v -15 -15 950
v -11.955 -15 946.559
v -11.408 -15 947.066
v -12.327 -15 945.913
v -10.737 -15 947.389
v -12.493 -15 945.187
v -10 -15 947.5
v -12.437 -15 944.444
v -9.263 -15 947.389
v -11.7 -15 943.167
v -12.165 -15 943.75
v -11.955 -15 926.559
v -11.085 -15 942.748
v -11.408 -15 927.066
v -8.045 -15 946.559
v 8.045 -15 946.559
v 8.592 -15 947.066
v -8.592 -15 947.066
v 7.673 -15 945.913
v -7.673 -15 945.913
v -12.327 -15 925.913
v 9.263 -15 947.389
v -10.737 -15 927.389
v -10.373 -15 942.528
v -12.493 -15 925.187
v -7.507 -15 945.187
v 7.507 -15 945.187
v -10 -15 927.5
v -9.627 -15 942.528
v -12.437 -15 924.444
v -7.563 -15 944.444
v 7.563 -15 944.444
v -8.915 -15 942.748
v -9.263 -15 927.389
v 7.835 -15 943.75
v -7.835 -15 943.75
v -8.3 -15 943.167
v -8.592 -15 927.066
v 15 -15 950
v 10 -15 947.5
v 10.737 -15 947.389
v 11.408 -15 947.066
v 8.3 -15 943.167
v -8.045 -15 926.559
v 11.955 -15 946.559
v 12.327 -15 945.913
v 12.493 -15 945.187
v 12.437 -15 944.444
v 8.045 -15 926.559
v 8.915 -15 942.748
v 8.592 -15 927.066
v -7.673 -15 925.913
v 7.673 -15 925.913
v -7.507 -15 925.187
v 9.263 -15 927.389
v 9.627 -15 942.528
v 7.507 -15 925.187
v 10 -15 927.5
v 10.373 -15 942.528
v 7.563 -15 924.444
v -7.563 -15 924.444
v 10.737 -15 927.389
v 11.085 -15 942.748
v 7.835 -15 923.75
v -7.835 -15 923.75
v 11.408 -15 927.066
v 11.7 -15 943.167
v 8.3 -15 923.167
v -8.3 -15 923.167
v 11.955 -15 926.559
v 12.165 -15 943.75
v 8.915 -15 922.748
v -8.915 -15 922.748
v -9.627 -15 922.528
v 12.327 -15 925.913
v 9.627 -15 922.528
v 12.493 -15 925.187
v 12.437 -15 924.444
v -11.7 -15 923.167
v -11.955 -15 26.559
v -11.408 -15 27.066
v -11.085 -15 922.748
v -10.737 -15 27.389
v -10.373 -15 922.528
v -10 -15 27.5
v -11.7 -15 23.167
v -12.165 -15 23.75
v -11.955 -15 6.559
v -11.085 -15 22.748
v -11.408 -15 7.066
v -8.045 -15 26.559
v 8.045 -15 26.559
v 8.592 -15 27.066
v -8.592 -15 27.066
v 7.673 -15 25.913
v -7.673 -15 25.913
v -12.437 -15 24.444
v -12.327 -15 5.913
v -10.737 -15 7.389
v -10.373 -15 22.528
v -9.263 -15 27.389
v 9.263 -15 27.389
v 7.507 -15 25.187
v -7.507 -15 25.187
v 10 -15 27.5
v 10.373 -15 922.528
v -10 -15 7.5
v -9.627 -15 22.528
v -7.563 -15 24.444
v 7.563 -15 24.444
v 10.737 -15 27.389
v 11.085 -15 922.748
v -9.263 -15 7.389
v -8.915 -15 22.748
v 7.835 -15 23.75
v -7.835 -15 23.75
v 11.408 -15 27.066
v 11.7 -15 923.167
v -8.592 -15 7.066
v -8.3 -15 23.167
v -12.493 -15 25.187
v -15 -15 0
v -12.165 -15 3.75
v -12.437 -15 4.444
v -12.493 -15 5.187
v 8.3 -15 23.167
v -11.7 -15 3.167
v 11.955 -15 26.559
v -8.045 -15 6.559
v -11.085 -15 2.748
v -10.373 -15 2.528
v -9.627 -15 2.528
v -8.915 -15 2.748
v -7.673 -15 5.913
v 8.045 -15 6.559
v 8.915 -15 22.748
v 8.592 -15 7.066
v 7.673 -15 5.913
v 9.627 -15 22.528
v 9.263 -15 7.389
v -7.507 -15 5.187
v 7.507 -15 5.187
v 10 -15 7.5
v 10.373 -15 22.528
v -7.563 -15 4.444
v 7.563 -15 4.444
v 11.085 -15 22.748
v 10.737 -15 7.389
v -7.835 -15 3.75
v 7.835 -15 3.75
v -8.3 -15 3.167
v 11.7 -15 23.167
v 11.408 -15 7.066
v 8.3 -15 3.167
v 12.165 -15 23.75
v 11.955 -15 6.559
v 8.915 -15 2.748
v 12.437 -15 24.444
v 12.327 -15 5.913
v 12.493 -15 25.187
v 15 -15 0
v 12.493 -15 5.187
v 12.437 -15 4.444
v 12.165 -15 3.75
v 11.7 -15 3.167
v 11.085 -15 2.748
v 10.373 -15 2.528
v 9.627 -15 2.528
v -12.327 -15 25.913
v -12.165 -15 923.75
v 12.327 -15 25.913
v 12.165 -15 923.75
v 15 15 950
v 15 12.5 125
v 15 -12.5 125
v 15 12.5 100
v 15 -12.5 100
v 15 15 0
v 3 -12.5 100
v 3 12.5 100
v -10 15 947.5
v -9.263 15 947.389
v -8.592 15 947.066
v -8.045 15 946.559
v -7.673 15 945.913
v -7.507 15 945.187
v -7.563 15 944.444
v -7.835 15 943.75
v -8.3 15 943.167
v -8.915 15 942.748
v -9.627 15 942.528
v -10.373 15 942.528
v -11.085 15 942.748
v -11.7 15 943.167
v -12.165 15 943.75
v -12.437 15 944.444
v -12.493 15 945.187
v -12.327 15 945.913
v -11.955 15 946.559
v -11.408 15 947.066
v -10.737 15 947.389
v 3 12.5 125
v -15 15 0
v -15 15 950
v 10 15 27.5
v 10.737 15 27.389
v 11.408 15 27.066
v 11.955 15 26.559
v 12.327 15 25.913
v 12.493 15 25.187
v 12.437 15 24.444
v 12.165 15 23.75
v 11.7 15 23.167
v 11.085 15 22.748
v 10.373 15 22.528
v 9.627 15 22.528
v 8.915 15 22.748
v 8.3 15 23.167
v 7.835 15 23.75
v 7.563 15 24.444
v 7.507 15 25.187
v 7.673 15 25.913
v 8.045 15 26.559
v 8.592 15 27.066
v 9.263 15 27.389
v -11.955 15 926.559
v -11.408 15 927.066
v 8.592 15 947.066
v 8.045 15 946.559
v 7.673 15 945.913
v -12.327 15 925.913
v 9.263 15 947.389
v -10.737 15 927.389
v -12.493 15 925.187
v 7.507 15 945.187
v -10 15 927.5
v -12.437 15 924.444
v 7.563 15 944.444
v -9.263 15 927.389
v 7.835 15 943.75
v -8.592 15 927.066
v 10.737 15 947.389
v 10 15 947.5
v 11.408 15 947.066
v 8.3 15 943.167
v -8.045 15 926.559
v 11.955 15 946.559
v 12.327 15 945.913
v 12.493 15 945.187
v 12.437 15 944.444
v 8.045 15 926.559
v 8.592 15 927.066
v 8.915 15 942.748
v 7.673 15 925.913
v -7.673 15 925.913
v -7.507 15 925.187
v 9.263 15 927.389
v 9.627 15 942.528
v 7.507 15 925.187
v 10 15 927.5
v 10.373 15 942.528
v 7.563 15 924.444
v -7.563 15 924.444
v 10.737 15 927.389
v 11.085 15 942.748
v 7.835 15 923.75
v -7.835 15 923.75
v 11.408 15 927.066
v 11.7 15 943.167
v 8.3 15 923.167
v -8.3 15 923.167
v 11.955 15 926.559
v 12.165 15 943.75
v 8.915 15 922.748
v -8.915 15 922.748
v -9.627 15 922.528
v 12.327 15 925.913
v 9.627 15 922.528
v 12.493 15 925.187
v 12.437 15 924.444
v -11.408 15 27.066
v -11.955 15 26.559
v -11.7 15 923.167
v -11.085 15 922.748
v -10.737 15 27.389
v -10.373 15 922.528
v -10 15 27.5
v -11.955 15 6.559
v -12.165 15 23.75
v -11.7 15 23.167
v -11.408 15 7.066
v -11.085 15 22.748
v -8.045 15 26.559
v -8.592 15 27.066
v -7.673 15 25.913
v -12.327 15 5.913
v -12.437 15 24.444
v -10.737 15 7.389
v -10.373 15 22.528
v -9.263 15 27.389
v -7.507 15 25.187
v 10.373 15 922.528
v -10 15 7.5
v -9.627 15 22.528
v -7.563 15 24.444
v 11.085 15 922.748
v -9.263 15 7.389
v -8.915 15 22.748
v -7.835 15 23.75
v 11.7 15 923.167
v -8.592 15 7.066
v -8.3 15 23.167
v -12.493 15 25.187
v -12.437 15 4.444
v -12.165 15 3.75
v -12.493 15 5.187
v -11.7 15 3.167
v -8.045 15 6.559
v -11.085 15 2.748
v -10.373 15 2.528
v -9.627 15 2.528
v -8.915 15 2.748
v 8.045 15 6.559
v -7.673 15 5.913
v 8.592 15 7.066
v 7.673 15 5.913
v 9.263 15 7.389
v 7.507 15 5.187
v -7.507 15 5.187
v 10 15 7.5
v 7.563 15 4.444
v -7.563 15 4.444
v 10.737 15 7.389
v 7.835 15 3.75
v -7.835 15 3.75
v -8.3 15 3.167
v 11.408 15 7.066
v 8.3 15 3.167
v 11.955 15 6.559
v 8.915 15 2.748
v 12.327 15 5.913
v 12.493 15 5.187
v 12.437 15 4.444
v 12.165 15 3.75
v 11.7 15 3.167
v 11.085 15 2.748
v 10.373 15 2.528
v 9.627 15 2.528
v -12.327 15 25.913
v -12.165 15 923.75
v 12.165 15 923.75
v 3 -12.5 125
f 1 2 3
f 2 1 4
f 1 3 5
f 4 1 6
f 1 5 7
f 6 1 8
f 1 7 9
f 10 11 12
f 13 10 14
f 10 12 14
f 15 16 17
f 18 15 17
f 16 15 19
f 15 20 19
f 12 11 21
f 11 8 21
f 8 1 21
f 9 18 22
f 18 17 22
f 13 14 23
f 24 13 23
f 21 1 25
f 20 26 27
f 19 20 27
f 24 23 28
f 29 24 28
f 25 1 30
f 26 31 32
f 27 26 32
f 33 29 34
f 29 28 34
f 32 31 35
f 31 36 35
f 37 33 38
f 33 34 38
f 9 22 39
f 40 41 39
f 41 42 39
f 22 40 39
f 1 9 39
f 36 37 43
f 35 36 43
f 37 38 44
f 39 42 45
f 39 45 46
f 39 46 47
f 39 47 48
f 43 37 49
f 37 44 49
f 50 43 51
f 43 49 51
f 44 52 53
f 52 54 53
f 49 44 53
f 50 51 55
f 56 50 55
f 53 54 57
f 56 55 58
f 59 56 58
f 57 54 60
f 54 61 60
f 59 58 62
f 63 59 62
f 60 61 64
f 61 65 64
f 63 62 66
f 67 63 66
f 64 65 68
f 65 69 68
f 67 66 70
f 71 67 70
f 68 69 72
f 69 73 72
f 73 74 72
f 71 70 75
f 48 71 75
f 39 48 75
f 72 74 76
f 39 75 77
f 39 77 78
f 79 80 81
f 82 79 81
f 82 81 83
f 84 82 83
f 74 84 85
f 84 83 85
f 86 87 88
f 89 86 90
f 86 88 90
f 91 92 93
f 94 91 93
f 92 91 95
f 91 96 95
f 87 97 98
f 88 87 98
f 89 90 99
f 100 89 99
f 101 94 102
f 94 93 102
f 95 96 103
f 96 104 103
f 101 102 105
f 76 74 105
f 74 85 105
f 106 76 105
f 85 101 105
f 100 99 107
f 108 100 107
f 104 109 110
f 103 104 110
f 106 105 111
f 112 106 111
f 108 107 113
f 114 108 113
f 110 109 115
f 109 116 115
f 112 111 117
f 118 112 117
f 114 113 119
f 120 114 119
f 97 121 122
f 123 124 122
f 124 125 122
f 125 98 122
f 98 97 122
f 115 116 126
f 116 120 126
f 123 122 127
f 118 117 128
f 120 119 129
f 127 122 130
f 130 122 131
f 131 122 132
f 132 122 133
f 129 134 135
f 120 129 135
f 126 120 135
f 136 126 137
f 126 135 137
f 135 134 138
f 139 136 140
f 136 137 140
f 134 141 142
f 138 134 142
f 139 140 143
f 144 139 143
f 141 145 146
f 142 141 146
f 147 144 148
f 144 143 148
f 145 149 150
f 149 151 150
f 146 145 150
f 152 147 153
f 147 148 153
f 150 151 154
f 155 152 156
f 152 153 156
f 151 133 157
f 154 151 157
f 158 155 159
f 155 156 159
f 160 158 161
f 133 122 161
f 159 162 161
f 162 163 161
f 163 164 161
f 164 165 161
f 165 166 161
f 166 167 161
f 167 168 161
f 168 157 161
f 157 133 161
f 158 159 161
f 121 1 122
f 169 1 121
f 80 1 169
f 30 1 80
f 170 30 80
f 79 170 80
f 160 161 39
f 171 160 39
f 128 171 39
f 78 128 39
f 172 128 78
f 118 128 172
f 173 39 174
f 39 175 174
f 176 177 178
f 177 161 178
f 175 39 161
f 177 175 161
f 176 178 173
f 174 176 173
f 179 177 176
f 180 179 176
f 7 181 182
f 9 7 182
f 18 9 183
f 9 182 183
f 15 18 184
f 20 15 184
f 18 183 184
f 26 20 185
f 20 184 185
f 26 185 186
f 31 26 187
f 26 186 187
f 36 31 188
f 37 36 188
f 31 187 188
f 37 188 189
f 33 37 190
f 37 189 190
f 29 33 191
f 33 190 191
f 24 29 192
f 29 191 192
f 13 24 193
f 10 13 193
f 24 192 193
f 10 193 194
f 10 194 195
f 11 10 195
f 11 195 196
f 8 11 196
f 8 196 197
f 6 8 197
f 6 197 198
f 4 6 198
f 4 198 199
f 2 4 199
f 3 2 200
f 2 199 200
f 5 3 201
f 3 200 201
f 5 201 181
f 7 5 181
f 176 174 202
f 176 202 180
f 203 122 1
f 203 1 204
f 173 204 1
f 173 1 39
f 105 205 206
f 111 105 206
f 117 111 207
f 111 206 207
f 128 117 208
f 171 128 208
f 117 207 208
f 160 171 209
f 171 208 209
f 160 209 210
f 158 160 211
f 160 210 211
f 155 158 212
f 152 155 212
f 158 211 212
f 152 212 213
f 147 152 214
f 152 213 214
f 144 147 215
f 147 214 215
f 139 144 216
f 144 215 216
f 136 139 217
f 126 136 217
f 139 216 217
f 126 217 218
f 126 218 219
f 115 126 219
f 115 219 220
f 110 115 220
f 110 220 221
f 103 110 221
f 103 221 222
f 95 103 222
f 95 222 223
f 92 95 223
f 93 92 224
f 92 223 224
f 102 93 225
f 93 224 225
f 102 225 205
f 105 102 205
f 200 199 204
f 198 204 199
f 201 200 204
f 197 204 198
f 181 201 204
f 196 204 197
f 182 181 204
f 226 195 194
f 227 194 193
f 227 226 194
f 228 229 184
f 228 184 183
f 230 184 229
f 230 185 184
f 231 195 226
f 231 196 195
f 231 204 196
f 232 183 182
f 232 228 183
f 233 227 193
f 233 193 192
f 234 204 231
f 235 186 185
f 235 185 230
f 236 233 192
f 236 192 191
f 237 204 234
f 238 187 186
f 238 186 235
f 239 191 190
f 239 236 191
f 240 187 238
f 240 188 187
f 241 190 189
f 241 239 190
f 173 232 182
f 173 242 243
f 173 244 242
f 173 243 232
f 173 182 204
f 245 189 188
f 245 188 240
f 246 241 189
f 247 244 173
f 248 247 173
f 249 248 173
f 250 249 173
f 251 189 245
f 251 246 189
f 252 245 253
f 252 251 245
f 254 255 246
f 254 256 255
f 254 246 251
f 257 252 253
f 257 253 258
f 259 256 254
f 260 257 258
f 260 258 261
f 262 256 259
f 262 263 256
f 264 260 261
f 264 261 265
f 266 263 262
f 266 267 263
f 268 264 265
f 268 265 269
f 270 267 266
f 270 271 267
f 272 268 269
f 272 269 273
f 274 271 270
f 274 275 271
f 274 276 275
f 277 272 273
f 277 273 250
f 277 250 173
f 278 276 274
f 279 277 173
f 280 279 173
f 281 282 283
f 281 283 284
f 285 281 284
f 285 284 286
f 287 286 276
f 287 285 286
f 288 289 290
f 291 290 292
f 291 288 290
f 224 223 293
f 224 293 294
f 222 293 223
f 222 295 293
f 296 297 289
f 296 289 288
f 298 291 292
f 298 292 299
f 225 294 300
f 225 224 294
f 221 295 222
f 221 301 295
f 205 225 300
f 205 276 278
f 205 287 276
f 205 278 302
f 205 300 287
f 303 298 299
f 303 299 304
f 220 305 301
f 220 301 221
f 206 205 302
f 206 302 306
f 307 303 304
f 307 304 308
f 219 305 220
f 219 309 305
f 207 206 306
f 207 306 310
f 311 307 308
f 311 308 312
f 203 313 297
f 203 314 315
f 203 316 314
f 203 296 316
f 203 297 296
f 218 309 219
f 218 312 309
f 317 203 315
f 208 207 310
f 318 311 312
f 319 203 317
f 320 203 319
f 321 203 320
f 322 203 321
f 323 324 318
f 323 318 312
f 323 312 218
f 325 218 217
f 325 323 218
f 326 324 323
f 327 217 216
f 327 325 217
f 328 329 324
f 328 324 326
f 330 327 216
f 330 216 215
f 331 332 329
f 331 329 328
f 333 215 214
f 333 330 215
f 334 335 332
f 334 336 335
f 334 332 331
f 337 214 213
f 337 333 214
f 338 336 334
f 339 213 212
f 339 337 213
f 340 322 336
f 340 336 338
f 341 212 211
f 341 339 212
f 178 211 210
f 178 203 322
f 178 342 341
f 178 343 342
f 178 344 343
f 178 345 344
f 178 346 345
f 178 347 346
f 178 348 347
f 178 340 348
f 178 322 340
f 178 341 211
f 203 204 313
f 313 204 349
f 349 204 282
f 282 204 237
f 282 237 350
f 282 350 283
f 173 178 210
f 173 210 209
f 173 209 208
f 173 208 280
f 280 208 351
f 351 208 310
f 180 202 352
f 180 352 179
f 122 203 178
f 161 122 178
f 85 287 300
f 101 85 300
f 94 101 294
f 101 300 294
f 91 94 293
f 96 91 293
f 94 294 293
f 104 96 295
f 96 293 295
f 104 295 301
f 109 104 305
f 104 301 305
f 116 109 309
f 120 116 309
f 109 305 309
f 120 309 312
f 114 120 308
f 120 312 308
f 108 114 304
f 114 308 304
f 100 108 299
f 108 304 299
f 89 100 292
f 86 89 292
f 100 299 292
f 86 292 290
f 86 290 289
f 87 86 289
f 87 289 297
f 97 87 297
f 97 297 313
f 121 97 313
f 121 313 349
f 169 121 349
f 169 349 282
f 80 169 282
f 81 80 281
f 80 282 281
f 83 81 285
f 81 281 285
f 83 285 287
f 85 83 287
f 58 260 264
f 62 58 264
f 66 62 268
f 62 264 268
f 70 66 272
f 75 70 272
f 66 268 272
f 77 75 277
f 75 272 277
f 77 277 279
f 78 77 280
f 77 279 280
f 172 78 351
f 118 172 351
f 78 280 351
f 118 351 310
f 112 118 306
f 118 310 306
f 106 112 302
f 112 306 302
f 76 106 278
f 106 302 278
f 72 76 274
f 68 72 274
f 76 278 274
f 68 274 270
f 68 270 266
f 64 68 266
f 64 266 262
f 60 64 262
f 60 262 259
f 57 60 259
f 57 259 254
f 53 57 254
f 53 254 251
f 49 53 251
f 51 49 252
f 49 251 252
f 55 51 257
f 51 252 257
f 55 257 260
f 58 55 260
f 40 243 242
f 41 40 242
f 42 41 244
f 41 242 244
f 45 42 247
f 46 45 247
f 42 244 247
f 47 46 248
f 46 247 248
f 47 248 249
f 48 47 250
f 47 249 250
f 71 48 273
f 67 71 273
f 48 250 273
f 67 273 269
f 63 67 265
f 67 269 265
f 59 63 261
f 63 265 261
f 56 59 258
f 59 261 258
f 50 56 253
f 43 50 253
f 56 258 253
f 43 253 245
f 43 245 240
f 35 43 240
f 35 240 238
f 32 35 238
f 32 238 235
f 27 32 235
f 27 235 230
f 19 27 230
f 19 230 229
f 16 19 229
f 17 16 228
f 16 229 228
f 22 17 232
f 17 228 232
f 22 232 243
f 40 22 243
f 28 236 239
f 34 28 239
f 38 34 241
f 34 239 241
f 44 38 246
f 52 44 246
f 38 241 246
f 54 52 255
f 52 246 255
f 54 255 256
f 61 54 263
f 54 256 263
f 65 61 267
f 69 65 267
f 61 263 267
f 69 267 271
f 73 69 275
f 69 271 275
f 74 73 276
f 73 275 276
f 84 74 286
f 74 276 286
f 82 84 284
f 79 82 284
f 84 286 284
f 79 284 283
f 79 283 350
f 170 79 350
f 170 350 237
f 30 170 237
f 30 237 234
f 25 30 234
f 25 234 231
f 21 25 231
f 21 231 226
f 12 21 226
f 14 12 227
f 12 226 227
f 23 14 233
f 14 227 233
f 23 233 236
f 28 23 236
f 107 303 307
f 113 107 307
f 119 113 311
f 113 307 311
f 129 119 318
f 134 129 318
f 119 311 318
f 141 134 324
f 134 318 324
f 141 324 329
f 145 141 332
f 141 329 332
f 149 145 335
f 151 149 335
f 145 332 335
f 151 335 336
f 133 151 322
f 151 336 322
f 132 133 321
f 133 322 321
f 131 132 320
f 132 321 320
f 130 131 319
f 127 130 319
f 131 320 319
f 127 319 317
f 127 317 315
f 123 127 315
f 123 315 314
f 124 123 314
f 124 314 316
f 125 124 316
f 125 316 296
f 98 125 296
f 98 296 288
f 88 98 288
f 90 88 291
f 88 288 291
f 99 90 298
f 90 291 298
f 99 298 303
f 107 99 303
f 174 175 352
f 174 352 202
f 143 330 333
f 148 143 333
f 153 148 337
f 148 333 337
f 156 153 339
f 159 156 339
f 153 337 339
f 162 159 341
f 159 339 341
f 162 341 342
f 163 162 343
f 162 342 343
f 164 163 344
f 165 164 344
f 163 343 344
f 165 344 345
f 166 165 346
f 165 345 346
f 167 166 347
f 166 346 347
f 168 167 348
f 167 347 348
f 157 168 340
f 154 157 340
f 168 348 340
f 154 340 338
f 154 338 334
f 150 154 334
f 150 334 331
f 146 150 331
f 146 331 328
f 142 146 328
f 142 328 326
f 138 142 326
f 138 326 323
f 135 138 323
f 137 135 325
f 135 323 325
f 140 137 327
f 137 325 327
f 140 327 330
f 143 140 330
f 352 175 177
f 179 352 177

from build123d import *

# Parameters (mm, degrees)
SKETCH1_W           = 30
SKETCH1_H           = 30
BOSS_EXTRUDE1_DEPTH = 950
SKETCH2_R           = 2.5
CUT_EXTRUDE1_DEPTH  = 30
SKETCH4_W           = 25
SKETCH4_H           = 25
CUT_EXTRUDE3_DEPTH  = 12


with BuildPart() as part:
    # Sketch1 → Boss-Extrude1 (new body)
    with BuildSketch(Plane.XY):
        Rectangle(SKETCH1_W, SKETCH1_H)
    extrude(amount=BOSS_EXTRUDE1_DEPTH)

    # Sketch2 → Cut-Extrude1 (cut)
    with BuildSketch(Plane(origin=(0, 15, 0), x_dir=(1, 0, 0), z_dir=(0, 1, 0))):
        with Locations(Location((-10, -925, 0), (0, 0, 270))):
            Circle(SKETCH2_R)
        with Locations(Location((10, -925, 0), (0, 0, 270))):
            Circle(SKETCH2_R)
        with Locations(Location((10, -945, 0), (0, 0, 270))):
            Circle(SKETCH2_R)
        with Locations(Location((-10, -945, 0), (0, 0, 270))):
            Circle(SKETCH2_R)
        with Locations(Location((-10, -5, 0), (0, 0, 270))):
            Circle(SKETCH2_R)
        with Locations(Location((10, -5, 0), (0, 0, 270))):
            Circle(SKETCH2_R)
        with Locations(Location((10, -25, 0), (0, 0, 270))):
            Circle(SKETCH2_R)
        with Locations(Location((-10, -25, 0), (0, 0, 270))):
            Circle(SKETCH2_R)
    extrude(amount=-CUT_EXTRUDE1_DEPTH, mode=Mode.SUBTRACT)

    # Sketch4 → Cut-Extrude3 (cut)
    with BuildSketch(Plane(origin=(15, 0, 0), x_dir=(0, 0, -1), z_dir=(1, 0, 0))):
        with Locations((-112.5, 0)):
            Rectangle(SKETCH4_W, SKETCH4_H)
    extrude(amount=-CUT_EXTRUDE3_DEPTH, mode=Mode.SUBTRACT)


solid = part.part
